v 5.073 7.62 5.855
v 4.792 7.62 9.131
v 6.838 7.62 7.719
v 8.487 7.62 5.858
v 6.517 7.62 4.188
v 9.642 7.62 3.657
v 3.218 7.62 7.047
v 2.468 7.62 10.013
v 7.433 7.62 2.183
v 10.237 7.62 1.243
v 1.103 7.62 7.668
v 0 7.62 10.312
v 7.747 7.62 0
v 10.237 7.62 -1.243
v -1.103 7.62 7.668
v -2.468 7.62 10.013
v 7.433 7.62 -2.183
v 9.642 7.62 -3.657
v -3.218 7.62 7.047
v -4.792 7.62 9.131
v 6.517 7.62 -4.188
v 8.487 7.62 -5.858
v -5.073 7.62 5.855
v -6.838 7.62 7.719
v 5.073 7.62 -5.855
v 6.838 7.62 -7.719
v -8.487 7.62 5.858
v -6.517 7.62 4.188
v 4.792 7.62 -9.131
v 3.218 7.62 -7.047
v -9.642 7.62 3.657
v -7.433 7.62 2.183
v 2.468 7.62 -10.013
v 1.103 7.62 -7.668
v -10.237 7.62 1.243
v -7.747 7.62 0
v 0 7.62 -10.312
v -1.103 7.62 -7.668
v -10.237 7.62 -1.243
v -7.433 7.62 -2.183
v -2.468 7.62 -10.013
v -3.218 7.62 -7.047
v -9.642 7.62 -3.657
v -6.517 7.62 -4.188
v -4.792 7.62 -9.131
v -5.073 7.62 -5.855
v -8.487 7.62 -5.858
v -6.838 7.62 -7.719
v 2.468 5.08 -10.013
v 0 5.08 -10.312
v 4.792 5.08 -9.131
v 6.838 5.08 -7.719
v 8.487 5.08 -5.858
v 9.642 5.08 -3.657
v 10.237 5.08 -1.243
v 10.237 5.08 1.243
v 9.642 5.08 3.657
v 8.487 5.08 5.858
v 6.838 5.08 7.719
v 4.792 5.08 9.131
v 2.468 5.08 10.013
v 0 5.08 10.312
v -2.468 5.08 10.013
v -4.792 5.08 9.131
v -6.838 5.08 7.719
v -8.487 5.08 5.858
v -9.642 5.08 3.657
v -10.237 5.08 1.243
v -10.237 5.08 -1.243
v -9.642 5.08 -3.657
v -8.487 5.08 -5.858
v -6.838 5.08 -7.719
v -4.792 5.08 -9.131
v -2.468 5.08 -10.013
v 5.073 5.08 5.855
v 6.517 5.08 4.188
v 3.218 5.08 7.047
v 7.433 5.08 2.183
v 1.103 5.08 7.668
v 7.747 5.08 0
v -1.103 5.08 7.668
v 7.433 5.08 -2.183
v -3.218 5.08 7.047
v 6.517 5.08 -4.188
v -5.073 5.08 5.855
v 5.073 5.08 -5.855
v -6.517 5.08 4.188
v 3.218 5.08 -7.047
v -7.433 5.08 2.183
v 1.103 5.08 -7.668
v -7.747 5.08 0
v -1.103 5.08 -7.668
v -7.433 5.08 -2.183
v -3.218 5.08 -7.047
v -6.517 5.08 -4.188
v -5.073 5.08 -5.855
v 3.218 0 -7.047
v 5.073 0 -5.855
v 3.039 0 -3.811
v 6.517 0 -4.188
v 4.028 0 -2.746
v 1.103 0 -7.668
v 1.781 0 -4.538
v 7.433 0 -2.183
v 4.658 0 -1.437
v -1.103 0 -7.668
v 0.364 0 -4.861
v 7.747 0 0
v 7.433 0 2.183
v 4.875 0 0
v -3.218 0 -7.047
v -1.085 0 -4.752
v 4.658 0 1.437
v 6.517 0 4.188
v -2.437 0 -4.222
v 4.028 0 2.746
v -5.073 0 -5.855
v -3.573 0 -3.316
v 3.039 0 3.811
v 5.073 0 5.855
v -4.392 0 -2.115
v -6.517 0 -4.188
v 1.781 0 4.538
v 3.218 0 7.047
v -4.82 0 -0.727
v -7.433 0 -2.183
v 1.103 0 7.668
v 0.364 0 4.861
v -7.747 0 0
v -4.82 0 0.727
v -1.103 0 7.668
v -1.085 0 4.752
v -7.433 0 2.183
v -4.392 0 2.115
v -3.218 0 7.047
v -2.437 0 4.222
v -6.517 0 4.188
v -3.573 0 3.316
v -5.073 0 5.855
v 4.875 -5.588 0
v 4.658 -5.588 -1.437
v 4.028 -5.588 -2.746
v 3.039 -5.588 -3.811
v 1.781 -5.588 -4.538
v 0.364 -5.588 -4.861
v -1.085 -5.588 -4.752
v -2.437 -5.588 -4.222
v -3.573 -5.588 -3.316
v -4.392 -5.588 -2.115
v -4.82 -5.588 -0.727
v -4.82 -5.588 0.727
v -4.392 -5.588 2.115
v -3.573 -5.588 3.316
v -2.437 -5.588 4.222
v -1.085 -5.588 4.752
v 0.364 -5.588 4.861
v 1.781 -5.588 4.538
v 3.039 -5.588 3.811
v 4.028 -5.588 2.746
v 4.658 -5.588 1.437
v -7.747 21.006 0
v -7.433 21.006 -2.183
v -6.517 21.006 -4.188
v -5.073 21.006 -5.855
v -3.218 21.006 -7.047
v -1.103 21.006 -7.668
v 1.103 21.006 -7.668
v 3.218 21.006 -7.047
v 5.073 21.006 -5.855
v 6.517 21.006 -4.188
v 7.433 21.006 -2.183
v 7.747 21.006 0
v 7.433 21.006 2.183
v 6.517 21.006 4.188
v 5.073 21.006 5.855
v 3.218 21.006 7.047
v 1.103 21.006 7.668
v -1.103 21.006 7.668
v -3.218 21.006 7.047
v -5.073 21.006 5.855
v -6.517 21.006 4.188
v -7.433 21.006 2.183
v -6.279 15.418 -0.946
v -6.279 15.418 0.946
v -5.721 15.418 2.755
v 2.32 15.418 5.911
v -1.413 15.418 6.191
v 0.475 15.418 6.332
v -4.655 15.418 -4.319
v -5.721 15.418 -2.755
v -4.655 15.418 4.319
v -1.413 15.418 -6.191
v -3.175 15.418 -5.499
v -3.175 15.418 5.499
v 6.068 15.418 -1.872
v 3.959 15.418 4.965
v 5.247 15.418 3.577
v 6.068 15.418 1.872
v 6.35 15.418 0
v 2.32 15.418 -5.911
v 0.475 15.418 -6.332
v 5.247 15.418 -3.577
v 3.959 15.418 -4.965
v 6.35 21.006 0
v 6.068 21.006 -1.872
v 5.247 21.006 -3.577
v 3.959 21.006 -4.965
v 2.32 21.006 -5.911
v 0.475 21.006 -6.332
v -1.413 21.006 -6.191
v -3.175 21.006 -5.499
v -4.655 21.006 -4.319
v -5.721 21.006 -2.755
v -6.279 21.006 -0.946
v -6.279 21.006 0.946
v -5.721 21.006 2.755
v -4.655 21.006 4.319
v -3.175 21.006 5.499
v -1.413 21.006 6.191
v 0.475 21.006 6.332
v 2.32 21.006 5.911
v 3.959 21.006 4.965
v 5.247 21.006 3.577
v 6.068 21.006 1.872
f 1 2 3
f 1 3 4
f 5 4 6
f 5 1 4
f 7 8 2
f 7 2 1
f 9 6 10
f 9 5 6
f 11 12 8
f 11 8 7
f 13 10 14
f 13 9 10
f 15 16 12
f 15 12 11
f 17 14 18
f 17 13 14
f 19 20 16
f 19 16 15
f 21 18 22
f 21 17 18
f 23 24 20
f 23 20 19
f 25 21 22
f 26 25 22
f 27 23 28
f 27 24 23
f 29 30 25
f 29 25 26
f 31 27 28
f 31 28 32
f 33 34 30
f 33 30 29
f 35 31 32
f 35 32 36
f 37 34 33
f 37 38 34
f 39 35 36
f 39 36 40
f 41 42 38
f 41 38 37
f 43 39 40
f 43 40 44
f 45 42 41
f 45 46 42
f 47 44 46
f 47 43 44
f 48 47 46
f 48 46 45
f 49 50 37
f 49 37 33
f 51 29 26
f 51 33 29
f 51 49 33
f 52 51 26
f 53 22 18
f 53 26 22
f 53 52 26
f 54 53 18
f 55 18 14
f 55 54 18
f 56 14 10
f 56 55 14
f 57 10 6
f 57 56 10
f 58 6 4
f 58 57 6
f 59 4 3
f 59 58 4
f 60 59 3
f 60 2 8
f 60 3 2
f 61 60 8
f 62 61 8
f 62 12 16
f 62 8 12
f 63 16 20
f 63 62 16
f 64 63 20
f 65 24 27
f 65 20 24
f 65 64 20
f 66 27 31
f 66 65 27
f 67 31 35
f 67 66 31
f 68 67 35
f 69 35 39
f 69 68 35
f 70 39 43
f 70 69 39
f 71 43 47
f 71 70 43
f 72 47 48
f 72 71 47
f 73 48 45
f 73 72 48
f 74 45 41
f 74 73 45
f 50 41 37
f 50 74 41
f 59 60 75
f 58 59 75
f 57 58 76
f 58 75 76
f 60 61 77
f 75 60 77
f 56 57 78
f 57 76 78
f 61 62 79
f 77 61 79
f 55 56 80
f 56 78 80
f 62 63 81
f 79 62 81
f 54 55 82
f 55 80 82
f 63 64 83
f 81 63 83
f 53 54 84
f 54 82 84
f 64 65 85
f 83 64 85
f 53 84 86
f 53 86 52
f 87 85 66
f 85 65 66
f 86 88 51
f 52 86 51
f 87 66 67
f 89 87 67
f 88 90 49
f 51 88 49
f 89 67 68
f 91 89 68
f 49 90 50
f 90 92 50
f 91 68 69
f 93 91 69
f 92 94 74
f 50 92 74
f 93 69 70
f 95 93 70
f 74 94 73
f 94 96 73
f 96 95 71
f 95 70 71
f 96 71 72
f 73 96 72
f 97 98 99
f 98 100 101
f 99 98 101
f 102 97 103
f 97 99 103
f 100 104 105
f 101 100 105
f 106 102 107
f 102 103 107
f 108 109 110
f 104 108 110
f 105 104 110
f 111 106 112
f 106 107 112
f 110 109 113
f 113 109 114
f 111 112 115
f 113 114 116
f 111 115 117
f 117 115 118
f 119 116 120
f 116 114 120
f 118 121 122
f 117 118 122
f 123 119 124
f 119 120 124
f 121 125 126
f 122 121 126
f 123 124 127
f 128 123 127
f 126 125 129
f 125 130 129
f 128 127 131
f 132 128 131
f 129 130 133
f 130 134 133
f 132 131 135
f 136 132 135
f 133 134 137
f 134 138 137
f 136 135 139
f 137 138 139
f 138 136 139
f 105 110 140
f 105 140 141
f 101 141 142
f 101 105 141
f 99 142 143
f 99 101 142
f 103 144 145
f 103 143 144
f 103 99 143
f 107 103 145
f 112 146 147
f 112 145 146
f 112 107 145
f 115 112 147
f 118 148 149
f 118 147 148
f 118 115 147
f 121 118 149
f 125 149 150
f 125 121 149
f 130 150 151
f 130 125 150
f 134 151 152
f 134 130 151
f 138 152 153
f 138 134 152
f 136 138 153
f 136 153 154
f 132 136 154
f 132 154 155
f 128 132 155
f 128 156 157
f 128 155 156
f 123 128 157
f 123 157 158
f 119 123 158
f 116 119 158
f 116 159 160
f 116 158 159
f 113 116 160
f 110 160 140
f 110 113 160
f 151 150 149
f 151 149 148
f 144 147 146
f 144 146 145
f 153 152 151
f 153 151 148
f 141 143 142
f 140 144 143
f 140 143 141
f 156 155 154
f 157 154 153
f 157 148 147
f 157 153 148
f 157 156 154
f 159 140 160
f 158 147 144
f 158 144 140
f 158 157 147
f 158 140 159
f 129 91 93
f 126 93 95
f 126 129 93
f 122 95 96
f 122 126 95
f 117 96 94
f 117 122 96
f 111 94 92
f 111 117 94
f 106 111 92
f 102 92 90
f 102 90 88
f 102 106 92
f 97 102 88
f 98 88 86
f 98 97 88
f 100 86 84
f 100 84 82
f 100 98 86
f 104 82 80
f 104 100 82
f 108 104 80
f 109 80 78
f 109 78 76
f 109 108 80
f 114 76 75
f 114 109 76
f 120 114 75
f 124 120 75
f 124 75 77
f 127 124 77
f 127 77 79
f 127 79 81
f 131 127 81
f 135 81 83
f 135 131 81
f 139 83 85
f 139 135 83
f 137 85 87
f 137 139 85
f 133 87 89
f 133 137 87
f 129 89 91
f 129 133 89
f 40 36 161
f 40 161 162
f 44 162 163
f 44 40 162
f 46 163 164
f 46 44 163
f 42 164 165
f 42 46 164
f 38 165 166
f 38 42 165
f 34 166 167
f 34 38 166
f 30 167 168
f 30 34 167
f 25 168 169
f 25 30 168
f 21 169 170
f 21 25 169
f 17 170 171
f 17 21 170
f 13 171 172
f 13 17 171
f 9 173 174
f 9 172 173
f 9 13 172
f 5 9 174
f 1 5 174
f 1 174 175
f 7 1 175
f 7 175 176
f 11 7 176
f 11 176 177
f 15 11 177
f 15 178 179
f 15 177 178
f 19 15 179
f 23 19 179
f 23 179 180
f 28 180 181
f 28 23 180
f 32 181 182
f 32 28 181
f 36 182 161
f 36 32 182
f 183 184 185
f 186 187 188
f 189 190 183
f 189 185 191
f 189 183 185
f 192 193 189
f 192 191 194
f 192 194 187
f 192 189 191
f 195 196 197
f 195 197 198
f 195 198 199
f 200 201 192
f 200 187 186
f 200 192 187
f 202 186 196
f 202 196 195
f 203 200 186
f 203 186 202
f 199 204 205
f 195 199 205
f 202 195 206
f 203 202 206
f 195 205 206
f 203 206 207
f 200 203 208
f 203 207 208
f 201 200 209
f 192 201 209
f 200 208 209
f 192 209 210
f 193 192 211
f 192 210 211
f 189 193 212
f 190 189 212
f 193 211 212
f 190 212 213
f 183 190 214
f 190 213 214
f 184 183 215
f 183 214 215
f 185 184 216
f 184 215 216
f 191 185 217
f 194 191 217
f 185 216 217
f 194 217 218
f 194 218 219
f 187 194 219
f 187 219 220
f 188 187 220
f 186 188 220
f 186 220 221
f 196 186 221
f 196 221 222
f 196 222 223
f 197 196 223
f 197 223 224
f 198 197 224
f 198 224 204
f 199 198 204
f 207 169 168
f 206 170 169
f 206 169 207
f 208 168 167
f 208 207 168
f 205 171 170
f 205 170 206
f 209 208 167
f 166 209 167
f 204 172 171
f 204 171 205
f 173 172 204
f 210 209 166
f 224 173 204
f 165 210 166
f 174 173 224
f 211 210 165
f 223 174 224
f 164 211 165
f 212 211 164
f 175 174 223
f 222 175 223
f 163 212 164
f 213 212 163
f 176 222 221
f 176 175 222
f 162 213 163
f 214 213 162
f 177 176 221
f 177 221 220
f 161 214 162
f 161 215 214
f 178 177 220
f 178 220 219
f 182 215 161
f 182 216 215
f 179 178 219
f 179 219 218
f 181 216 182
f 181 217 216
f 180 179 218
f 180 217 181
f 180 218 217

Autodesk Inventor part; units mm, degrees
ref_plane "YZ Plane" through (0, 0, 0) normal (1, 0, 0) x (0, 1, 0)
ref_plane "XZ Plane" through (0, 0, 0) normal (0, 1, 0) x (-1, 0, 0)
ref_plane "XY Plane" through (0, 0, 0) normal (0, 0, 1) x (1, 0, 0)
sketch "Sketch1" plane through (0, 0, 0) normal (0, 1, 0) x (-1, 0, 0)
  circle A0 centre (0, 0) radius 7.747
  dimension "d0" = 15.494
extrude "Extrusion1" add sketch "Sketch1" along normal blind 21.0058
sketch "Sketch2" plane through (0, 0, 0) normal (1, 0, 0) x (0, 1, 0)
  line L0 (5.08, 0) -> (7.62, 0)
  line L1 (7.62, 0) -> (7.62, -10.3124)
  line L2 (7.62, -10.3124) -> (5.08, -10.3124)
  line L3 (5.08, -10.3124) -> (5.08, 0)
  line L4 (0, 7.747) -> (0, -7.747) projected
  point P0 (0, 0)
  dimension "d3" = 10.3124
  dimension "d4" = 5.08
  dimension "d5" = 2.54
revolve "Revolution1" add sketch "Sketch2" angle 360 about axis through (0, 5.08, 0) along (0, 1, 0)
sketch "Sketch3" plane through (0, 0, 0) normal (0, -1, 0) x (1, 0, 0)
  circle A0 centre (0, 0) radius 7.747 projected
  circle A1 centre (0, 0) radius 4.8747
extrude "Extrusion2" add sketch "Sketch3" along normal blind 5.588 contours A1
sketch "Sketch4" plane through (0, 21.0058, 0) normal (0, 1, 0) x (1, 0, 0)
  circle A0 centre (0, 0) radius 7.747 projected
  circle A1 centre (0, 0) radius 6.35
  dimension "d9" = 12.7
extrude "Extrusion3" cut sketch "Sketch4" against normal blind 5.588 contours A1
properties part number "BiglConnector"
